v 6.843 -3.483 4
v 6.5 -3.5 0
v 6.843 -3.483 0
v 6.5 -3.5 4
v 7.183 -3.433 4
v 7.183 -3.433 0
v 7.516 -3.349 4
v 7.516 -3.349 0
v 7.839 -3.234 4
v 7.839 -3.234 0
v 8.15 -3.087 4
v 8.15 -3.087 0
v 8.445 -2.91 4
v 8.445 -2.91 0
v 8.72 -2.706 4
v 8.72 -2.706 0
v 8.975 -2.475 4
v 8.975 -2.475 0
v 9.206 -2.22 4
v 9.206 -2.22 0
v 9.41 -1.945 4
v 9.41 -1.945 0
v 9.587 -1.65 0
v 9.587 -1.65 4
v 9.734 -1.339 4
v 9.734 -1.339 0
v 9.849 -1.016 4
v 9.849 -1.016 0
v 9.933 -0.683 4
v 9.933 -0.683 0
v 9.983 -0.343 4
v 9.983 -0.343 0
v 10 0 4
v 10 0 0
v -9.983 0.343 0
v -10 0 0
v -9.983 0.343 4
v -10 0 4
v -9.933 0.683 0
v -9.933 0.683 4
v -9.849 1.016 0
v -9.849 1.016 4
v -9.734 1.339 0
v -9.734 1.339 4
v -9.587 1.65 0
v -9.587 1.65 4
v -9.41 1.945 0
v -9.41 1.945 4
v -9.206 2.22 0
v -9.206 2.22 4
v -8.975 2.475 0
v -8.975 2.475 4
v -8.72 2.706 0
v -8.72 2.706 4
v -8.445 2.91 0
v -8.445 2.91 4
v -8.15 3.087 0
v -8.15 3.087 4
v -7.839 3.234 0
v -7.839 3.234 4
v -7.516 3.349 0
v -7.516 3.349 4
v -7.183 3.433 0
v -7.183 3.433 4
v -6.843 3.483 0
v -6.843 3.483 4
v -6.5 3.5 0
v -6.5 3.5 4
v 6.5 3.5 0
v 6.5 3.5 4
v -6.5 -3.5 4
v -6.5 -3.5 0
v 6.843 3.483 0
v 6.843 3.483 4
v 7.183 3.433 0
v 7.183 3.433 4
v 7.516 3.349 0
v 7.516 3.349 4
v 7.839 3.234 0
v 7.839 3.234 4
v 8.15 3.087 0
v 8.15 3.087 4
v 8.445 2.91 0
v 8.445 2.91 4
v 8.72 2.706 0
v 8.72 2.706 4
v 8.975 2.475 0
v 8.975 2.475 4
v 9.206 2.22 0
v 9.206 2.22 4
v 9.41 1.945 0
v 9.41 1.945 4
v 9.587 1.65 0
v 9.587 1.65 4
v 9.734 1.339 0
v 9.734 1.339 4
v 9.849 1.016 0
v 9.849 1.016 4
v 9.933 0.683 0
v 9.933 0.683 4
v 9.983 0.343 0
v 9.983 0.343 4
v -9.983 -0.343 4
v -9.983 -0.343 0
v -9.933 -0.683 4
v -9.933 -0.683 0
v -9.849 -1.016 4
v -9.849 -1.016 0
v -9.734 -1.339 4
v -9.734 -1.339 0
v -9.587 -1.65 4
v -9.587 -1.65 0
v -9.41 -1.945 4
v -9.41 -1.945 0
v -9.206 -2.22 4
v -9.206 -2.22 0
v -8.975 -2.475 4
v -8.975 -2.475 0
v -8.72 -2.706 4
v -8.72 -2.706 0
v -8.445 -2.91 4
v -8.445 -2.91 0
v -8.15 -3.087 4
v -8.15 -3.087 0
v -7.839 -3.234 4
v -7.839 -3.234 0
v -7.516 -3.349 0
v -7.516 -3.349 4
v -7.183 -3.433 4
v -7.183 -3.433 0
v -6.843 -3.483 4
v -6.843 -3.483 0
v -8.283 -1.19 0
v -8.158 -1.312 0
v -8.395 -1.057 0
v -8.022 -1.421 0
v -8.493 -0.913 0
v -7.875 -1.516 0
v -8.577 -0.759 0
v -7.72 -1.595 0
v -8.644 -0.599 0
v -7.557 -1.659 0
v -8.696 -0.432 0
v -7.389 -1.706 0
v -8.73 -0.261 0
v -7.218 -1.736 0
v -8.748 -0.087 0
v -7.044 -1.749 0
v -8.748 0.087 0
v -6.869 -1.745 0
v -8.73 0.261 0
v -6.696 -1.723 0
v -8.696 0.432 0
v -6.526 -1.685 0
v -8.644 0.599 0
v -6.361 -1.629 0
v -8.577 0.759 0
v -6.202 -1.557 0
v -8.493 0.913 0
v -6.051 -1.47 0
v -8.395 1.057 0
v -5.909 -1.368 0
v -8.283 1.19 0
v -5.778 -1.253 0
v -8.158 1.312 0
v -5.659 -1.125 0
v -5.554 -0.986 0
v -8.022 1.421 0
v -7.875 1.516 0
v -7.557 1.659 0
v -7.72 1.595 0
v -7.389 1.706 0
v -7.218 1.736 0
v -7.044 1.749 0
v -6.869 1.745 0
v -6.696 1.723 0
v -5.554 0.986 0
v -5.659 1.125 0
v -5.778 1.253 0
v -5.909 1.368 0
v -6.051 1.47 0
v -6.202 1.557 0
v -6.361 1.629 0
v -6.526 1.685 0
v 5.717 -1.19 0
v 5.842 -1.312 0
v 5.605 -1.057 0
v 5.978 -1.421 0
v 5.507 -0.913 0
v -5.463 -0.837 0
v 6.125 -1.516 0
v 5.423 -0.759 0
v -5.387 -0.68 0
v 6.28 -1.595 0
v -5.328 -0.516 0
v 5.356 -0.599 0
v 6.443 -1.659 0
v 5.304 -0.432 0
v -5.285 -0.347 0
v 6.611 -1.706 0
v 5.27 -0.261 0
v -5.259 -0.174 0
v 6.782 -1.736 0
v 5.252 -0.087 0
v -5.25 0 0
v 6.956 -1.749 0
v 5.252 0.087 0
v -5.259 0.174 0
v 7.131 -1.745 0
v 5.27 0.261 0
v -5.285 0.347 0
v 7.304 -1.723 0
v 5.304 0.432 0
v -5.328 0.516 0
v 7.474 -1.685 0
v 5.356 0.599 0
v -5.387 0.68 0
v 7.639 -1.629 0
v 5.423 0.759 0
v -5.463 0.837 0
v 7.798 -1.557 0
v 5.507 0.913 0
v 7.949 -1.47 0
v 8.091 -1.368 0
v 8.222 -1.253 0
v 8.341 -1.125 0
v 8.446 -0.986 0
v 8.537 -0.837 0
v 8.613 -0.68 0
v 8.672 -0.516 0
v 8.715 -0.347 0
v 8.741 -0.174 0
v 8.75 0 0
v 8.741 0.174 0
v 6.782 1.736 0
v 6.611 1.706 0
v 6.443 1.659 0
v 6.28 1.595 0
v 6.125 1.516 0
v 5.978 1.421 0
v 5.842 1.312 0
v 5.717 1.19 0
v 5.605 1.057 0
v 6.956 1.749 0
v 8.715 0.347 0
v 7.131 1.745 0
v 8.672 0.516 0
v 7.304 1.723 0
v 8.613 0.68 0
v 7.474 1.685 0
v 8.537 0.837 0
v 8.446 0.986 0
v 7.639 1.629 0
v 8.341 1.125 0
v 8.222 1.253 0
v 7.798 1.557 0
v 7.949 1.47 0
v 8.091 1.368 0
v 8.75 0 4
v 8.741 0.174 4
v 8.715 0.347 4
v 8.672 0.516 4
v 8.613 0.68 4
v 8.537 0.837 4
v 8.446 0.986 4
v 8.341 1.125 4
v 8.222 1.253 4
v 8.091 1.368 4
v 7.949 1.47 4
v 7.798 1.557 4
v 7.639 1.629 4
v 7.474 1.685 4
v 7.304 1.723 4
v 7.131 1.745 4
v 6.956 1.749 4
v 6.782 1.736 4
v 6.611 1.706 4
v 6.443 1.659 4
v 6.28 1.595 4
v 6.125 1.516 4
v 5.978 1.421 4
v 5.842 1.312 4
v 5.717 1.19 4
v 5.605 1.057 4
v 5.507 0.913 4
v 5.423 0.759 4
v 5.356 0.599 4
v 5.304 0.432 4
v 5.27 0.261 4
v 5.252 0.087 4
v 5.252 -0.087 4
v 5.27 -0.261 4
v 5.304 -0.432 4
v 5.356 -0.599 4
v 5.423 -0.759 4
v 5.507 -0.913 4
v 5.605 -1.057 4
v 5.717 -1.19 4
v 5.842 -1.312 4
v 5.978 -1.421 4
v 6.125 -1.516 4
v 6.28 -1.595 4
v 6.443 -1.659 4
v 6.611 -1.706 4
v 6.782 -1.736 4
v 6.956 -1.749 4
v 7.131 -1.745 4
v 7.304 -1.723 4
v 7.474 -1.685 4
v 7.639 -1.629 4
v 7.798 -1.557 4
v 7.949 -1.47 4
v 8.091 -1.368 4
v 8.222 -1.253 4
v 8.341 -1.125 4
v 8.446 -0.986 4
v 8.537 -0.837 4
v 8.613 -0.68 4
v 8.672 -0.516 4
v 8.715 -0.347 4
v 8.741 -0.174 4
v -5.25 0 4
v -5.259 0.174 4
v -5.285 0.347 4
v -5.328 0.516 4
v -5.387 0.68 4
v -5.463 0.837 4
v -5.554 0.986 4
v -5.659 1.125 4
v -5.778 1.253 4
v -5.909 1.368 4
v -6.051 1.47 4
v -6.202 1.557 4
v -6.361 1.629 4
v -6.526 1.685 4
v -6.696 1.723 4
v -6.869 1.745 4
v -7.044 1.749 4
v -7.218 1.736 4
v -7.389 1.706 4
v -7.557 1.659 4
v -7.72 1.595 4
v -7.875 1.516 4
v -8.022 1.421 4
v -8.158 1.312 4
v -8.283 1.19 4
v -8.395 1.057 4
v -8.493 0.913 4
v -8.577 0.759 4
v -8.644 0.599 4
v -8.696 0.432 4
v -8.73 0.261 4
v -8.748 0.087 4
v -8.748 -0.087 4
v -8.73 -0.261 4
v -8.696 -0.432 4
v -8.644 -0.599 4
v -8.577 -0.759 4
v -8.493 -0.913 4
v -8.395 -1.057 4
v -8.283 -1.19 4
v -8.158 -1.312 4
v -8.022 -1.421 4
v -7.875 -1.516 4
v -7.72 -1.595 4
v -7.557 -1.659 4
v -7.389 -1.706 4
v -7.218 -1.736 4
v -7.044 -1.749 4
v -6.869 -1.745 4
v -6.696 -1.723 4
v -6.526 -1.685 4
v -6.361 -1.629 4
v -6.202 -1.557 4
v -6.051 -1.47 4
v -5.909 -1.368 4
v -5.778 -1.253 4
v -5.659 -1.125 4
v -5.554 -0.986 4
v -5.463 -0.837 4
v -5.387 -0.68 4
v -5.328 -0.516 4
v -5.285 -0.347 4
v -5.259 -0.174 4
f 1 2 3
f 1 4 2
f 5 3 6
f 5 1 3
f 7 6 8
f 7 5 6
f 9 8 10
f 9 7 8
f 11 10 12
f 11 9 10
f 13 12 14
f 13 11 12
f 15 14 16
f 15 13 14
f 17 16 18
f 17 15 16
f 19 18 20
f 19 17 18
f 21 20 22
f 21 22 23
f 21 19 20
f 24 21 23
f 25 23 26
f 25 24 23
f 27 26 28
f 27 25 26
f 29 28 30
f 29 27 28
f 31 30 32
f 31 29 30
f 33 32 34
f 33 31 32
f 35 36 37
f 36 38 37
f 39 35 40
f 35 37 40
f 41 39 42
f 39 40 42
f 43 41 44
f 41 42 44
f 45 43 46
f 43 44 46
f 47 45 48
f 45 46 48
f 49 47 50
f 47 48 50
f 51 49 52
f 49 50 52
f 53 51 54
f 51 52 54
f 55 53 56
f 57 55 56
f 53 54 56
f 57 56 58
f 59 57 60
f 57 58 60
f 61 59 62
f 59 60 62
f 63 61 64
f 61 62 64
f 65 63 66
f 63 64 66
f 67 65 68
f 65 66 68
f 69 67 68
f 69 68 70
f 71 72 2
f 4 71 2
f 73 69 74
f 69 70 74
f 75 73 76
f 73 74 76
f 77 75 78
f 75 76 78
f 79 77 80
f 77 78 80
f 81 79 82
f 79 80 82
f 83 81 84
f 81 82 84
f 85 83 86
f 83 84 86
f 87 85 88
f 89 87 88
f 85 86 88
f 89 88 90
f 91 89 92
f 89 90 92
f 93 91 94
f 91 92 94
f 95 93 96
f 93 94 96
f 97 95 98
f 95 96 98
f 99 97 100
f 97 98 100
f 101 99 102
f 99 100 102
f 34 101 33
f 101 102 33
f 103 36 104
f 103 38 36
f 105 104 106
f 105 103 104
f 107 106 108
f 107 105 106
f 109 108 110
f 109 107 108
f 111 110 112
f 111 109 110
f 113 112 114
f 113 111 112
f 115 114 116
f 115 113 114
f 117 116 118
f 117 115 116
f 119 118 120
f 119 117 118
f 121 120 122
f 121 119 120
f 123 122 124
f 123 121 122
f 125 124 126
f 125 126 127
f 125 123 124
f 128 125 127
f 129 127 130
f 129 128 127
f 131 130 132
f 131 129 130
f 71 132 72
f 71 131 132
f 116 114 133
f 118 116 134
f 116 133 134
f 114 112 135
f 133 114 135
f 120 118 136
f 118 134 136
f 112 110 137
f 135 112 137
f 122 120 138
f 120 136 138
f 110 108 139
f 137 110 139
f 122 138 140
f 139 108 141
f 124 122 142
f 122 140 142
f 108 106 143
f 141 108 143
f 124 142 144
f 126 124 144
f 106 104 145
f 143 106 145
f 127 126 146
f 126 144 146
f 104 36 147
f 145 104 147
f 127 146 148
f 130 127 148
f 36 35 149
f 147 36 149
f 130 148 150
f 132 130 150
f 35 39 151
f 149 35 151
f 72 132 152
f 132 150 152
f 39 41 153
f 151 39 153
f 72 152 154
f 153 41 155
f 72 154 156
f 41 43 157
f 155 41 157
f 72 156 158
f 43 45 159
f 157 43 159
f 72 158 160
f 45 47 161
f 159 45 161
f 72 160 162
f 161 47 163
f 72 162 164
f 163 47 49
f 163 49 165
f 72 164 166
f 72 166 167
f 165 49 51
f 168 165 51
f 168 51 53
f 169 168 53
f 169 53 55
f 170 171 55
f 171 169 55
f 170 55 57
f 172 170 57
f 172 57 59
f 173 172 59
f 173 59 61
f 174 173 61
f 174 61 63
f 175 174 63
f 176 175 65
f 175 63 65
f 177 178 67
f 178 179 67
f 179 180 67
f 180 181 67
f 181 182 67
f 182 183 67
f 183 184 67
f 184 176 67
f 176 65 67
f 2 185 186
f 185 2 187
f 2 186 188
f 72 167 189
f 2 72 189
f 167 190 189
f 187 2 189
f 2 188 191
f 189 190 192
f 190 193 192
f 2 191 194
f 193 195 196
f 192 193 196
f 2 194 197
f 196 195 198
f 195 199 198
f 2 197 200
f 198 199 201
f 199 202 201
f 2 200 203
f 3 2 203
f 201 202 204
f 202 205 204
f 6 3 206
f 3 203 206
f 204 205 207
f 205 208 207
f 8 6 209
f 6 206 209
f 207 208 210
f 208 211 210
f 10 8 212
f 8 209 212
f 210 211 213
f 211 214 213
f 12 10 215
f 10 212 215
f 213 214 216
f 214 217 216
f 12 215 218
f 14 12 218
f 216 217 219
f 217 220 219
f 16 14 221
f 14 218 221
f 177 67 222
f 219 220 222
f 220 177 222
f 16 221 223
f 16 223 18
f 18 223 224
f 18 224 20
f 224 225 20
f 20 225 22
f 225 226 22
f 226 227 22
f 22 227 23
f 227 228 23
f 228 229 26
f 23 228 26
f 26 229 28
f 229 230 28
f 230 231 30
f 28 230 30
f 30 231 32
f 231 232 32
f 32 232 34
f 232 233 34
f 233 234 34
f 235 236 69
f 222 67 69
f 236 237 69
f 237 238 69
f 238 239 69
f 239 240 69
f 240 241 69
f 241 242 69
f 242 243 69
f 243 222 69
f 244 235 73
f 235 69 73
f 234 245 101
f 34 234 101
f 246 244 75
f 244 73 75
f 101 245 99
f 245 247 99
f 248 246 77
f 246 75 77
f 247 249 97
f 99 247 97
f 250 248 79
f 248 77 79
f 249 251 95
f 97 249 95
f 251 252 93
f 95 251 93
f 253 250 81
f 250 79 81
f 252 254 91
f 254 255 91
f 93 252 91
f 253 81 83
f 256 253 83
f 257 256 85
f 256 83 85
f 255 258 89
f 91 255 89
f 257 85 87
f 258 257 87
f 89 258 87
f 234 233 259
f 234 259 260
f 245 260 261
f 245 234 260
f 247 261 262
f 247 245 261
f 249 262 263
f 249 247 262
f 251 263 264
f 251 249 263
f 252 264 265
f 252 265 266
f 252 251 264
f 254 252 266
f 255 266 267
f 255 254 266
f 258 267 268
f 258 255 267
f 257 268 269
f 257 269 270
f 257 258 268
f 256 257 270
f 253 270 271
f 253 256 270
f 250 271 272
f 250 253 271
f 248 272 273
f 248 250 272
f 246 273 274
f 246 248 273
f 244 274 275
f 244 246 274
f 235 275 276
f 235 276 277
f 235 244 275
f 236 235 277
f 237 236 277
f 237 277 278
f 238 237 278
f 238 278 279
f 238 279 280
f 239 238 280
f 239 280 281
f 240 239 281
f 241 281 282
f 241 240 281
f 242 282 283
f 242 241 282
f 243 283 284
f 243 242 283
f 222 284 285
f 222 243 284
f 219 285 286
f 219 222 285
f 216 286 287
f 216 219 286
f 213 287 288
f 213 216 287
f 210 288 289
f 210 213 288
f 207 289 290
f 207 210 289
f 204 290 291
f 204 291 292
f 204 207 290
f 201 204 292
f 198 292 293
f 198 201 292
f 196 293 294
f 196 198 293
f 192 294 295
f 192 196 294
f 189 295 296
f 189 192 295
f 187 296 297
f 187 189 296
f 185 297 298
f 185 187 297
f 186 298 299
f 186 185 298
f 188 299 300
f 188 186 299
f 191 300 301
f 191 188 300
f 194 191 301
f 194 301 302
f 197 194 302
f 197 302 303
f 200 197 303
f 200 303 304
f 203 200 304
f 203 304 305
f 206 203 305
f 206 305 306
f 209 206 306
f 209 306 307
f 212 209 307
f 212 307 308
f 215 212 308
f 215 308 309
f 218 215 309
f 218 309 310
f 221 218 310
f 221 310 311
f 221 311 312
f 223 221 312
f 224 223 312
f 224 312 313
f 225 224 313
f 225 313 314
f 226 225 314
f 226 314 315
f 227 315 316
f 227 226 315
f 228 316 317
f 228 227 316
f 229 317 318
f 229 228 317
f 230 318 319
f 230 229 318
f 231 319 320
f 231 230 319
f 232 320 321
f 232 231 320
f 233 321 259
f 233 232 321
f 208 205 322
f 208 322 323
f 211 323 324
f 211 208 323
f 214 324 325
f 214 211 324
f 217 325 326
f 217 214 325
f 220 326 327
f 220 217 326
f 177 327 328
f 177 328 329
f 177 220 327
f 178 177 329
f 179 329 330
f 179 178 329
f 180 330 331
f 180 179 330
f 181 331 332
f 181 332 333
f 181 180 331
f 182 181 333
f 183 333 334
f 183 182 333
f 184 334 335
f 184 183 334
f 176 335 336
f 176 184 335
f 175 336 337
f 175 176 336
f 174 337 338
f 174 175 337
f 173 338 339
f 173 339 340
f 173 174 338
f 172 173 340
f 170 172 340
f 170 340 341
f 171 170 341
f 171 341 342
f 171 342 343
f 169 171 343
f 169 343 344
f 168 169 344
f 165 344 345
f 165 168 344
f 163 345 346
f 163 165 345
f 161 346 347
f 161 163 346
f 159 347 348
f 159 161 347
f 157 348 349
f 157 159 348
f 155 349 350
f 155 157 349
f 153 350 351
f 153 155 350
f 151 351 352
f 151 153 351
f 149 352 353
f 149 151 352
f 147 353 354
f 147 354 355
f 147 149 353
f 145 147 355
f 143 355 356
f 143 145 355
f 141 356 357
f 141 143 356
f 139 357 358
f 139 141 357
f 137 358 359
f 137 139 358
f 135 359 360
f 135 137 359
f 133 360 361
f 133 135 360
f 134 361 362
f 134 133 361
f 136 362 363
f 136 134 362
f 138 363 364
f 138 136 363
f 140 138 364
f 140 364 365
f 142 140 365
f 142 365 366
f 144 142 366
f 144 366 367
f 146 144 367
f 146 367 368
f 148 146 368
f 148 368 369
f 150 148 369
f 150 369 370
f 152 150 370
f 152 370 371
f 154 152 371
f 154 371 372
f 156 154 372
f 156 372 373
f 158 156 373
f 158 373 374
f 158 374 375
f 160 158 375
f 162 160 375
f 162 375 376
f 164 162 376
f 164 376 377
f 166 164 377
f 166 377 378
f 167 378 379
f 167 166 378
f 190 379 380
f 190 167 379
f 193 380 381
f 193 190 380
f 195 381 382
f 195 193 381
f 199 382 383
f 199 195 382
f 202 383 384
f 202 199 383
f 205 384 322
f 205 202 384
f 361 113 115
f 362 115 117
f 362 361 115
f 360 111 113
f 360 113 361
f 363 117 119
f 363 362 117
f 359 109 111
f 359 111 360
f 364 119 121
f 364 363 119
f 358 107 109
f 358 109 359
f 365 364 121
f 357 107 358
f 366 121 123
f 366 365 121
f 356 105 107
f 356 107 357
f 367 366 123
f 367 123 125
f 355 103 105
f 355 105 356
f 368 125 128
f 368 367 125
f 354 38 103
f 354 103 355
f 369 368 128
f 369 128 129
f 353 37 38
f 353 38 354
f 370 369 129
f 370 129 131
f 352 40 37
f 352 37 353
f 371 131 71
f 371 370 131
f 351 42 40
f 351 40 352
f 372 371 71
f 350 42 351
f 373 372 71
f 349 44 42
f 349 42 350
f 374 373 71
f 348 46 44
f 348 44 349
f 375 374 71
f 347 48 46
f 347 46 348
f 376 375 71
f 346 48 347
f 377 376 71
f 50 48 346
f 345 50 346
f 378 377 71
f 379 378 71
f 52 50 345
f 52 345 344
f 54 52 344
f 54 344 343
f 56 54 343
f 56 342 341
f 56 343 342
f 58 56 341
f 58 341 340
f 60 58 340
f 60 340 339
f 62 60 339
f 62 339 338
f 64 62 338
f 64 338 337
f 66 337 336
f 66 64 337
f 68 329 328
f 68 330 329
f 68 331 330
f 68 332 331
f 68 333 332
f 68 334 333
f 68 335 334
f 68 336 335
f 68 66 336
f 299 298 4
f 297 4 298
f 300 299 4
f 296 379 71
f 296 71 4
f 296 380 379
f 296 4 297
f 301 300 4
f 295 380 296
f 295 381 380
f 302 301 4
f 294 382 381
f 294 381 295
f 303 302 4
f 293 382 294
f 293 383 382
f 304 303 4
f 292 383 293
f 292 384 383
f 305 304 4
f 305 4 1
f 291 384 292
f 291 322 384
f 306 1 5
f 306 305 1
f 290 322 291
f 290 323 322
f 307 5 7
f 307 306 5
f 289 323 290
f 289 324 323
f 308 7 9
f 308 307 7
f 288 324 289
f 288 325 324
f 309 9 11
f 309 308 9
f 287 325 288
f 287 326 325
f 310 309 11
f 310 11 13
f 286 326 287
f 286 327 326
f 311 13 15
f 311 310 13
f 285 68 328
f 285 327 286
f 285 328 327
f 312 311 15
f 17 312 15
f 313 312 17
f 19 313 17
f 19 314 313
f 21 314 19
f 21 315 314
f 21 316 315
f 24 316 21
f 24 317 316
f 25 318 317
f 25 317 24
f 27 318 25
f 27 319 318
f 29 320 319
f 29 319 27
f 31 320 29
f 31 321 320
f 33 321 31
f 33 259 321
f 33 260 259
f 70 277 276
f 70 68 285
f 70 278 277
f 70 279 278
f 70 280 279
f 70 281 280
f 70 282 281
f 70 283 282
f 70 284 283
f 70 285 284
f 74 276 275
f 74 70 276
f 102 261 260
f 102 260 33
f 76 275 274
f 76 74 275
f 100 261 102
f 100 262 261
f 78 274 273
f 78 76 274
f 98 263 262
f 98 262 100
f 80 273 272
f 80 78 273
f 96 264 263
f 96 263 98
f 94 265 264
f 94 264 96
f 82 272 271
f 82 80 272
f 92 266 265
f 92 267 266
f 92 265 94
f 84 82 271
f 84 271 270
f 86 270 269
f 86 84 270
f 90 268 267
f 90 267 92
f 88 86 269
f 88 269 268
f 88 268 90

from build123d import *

# Parameters (mm, degrees)
SKETCH1_W           = 20
SKETCH1_H           = 7
SKETCH1_R           = 1.75
BOSS_EXTRUDE1_DEPTH = 4
FILLET1_R           = 3.5


with BuildPart() as part:
    # Sketch1 → Boss-Extrude1 (new body)
    with BuildSketch(Plane.XY):
        Rectangle(SKETCH1_W, SKETCH1_H)
        with Locations((-7, 0)):
            Circle(SKETCH1_R, mode=Mode.SUBTRACT)
        with Locations((7, 0)):
            Circle(SKETCH1_R, mode=Mode.SUBTRACT)
    extrude(amount=BOSS_EXTRUDE1_DEPTH)

    # Fillet1
    fillet1_edges = [part.edges().sort_by_distance(p)[0] for p in [
        (-10, 3.5, 2),
        (-10, -3.5, 2),
        (10, -3.5, 2),
        (10, 3.5, 2),
    ]]
    fillet(fillet1_edges, radius=FILLET1_R - 0.0001)  # a hair under: the kernel refuses the full size


solid = part.part
